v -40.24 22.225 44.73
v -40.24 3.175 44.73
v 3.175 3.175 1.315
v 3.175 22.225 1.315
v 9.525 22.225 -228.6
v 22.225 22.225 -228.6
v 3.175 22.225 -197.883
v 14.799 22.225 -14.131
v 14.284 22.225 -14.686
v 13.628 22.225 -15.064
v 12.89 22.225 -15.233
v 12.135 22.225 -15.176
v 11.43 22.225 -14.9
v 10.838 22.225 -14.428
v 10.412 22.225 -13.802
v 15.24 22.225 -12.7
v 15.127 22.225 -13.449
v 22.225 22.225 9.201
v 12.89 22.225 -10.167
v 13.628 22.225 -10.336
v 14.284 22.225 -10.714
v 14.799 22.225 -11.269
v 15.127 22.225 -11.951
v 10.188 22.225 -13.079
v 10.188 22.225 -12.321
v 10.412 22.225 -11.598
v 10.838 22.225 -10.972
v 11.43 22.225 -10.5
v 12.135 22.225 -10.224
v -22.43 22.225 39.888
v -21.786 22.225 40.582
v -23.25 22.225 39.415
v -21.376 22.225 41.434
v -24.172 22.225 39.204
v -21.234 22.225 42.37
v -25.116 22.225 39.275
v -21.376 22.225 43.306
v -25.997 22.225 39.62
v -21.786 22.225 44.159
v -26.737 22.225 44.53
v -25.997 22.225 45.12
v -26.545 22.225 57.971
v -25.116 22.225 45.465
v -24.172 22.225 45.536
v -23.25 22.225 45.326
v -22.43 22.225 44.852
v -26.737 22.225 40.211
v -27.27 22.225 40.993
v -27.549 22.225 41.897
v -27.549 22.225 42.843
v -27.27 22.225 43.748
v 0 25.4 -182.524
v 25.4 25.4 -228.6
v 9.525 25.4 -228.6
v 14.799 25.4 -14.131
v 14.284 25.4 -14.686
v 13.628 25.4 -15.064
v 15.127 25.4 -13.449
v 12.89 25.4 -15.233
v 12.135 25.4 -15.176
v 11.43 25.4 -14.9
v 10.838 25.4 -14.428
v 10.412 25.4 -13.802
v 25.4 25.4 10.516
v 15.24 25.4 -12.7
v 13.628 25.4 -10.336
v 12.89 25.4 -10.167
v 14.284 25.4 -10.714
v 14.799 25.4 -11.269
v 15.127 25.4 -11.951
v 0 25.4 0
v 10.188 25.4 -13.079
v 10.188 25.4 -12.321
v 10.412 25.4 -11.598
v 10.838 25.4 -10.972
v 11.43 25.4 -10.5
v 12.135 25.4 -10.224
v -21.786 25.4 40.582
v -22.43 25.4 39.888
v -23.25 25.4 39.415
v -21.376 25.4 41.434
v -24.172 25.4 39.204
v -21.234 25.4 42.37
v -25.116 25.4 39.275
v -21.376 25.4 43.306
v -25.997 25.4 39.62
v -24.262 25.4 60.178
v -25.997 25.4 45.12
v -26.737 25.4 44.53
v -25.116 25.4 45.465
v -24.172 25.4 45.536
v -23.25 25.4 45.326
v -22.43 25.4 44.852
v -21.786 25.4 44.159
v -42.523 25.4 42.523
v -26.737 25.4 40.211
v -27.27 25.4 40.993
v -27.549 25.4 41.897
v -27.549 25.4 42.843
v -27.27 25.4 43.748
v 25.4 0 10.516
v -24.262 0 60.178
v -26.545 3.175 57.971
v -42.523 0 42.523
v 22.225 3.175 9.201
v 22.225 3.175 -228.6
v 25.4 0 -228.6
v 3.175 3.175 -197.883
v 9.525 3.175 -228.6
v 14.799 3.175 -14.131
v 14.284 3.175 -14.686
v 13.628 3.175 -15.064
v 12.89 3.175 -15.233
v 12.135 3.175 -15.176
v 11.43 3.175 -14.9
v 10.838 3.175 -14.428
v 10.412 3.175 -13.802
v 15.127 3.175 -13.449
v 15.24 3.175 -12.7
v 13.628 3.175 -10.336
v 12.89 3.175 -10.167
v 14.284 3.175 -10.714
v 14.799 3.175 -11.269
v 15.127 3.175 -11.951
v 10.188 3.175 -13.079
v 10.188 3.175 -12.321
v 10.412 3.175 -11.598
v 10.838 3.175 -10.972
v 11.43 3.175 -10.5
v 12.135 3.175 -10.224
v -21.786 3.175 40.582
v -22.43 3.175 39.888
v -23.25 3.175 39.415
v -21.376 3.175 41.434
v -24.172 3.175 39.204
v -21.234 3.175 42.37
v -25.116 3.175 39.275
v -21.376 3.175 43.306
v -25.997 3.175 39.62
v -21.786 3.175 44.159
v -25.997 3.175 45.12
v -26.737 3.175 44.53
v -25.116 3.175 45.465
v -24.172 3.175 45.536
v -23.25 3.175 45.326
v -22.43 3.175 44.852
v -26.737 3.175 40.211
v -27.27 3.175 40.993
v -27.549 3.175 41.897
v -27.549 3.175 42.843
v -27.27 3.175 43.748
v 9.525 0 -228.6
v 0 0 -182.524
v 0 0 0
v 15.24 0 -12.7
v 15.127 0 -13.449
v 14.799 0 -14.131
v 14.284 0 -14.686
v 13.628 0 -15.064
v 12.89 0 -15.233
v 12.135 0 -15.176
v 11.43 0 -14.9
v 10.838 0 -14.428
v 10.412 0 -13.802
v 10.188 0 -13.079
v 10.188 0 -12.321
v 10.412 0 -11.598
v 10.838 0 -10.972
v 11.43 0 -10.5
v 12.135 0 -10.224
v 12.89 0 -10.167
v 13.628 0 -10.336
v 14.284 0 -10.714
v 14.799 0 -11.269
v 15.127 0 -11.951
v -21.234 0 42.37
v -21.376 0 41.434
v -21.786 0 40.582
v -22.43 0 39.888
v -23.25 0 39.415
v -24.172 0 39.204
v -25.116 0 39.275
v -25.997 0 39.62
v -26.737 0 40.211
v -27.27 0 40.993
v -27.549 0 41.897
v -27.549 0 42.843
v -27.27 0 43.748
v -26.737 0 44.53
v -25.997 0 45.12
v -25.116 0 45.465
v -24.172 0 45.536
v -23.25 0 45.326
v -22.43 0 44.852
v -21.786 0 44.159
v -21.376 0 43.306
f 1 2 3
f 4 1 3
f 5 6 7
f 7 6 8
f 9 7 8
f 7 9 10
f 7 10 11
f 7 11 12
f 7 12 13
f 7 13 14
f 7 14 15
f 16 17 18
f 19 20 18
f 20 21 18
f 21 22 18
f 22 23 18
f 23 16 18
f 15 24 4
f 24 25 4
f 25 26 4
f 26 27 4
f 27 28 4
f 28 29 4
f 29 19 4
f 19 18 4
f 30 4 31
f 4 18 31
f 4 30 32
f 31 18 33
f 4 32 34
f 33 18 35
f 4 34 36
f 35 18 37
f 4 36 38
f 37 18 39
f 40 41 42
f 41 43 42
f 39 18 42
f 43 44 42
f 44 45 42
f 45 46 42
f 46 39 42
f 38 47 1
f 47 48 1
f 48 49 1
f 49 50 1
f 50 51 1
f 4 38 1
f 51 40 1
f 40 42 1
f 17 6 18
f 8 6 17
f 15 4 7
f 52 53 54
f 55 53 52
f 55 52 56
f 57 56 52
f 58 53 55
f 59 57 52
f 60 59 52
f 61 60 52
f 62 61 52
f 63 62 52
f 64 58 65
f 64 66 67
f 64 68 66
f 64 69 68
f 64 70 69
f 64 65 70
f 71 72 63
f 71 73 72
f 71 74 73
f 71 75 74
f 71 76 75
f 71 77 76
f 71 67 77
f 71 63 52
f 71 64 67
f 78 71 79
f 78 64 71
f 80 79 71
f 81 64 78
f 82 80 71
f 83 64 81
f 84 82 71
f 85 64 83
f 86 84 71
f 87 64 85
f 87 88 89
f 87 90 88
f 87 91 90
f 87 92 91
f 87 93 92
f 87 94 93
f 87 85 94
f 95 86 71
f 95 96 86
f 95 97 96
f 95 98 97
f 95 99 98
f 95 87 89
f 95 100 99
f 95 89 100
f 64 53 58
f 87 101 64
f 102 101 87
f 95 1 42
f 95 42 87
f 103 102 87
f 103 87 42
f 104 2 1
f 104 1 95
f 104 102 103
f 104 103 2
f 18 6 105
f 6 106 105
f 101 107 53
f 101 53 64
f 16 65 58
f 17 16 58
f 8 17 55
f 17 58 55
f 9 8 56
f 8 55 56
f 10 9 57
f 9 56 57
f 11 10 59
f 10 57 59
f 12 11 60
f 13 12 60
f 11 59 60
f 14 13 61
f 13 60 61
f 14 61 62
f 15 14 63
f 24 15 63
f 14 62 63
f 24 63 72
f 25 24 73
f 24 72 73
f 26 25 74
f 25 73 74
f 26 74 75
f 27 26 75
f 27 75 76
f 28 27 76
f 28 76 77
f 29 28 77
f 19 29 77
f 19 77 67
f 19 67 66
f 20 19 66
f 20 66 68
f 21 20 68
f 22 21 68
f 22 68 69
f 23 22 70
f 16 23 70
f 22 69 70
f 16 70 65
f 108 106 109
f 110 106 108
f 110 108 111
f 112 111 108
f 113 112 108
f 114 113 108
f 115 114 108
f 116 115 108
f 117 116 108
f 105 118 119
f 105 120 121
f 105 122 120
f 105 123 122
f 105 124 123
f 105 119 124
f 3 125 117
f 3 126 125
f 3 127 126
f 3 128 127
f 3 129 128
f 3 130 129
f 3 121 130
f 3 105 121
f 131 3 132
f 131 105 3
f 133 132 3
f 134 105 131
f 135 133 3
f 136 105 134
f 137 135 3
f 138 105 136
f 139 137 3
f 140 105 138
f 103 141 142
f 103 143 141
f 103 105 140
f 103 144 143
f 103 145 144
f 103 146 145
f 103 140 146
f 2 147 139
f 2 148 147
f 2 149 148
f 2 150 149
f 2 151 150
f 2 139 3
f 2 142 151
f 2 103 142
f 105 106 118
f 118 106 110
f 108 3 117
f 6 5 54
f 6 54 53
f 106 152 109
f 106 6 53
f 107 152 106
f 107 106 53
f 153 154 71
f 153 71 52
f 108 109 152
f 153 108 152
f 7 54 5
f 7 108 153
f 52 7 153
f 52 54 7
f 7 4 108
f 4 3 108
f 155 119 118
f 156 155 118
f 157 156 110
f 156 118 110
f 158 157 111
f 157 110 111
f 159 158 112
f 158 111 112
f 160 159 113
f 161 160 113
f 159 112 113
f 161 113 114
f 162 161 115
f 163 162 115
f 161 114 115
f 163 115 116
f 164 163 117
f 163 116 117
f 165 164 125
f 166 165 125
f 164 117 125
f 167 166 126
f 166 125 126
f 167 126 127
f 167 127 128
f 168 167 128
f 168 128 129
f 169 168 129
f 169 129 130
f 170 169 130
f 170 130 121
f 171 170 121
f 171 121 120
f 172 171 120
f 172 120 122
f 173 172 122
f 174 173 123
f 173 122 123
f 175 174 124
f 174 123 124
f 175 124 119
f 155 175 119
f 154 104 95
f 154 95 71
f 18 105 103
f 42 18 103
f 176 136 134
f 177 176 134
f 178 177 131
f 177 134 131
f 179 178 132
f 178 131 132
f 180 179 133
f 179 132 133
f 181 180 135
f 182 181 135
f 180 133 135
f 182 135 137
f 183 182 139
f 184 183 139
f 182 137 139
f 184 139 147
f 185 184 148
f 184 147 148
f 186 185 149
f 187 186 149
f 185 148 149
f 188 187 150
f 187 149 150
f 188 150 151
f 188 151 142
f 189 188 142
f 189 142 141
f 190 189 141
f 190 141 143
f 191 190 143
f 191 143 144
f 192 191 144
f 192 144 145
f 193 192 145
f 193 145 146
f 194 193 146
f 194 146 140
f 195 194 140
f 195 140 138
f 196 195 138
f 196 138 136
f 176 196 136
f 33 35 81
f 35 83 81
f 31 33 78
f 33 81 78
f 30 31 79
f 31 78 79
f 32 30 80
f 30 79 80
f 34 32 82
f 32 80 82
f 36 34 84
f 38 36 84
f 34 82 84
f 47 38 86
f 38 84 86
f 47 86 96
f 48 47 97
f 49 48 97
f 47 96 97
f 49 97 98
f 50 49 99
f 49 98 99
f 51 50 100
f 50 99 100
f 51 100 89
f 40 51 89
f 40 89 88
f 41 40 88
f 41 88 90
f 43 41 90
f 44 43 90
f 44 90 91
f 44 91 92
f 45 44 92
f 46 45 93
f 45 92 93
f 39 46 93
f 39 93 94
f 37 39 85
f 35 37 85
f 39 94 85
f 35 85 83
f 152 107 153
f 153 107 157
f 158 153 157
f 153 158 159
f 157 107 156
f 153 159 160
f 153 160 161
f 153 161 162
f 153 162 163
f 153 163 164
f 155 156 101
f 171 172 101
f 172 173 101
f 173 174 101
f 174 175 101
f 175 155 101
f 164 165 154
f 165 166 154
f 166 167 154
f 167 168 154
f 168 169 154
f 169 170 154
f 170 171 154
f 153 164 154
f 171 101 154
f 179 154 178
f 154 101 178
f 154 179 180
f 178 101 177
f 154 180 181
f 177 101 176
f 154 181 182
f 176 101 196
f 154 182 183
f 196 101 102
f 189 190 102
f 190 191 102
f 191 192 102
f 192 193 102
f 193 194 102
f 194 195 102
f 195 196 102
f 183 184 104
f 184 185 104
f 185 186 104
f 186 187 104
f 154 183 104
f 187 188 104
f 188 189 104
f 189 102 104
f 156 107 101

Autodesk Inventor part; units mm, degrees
ref_plane "YZ Plane" through (0, 0, 0) normal (1, 0, 0) x (0, 1, 0)
ref_plane "XZ Plane" through (0, 0, 0) normal (0, 1, 0) x (-1, 0, 0)
ref_plane "XY Plane" through (0, 0, 0) normal (0, 0, 1) x (1, 0, 0)
sketch "Sketch1" plane through (0, 0, 0) normal (0, 1, 0) x (-1, 0, 0)
  line L0 (0, 0) -> (0, -228.6)
  line L1 (0, -228.6) -> (-25.4, -228.6)
  line L2 (-25.4, -228.6) -> (-25.4, 10.5159)
  line L3 (-25.4, 10.5159) -> (24.2621, 60.178)
  line L4 (24.2621, 60.178) -> (42.5226, 42.5226)
  line L5 (42.5226, 42.5226) -> (0, 0)
  dimension "d0" = 228.6
  dimension "d1" = 25.4
  dimension "d2" = 135
  dimension "d3" = 25.4
extrude "Extrusion1" add sketch "Sketch1" along normal blind 25.4
sketch "Sketch2" plane through (0, 25.4, 0) normal (0, 1, 0) x (1, 0, 0)
  line L0 (25.4, 228.6) -> (0, 228.6) projected
  line L1 (9.525, 228.6) -> (0, 182.5245)
  line L2 (0, 228.6) -> (0, 0) projected
  dimension "d6" = 11.68
  dimension "d7" = 9.525
extrude "Extrusion2" cut sketch "Sketch2" against normal through all
shell "Shell1" thickness 3.175 removed faces 3 at (3.175, 16.9333, -197.883) at (14.8167, 8.4667, -228.6) at (-30.3489, 8.4667, 54.2929)
sketch "Sketch3" plane through (0, 25.4, 0) normal (0, 1, 0) x (1, 0, 0)
  circle A0 centre (-24.4095, -42.3701) radius 3.175
  line L0 (-42.5226, -42.5226) -> (-24.2621, -60.178) projected
  line L1 (0, 0) -> (-42.5226, -42.5226) projected
  line L2 (0, 0) -> (25.4, 0)
  line L3 (25.4, -10.5159) -> (25.4, 228.6) projected
  circle A1 centre (12.7, 12.7) radius 2.54
  line L4 (0, 182.5245) -> (0, 0) projected
  dimension "d11" = 6.35
  dimension "d12" = 12.7
  dimension "d13" = 12.7
  dimension "d14" = 5.08
  dimension "d15" = 12.7
  dimension "d16" = 12.7
extrude "Extrusion3" cut sketch "Sketch3" against normal through all
properties material "Aluminum 6061"
